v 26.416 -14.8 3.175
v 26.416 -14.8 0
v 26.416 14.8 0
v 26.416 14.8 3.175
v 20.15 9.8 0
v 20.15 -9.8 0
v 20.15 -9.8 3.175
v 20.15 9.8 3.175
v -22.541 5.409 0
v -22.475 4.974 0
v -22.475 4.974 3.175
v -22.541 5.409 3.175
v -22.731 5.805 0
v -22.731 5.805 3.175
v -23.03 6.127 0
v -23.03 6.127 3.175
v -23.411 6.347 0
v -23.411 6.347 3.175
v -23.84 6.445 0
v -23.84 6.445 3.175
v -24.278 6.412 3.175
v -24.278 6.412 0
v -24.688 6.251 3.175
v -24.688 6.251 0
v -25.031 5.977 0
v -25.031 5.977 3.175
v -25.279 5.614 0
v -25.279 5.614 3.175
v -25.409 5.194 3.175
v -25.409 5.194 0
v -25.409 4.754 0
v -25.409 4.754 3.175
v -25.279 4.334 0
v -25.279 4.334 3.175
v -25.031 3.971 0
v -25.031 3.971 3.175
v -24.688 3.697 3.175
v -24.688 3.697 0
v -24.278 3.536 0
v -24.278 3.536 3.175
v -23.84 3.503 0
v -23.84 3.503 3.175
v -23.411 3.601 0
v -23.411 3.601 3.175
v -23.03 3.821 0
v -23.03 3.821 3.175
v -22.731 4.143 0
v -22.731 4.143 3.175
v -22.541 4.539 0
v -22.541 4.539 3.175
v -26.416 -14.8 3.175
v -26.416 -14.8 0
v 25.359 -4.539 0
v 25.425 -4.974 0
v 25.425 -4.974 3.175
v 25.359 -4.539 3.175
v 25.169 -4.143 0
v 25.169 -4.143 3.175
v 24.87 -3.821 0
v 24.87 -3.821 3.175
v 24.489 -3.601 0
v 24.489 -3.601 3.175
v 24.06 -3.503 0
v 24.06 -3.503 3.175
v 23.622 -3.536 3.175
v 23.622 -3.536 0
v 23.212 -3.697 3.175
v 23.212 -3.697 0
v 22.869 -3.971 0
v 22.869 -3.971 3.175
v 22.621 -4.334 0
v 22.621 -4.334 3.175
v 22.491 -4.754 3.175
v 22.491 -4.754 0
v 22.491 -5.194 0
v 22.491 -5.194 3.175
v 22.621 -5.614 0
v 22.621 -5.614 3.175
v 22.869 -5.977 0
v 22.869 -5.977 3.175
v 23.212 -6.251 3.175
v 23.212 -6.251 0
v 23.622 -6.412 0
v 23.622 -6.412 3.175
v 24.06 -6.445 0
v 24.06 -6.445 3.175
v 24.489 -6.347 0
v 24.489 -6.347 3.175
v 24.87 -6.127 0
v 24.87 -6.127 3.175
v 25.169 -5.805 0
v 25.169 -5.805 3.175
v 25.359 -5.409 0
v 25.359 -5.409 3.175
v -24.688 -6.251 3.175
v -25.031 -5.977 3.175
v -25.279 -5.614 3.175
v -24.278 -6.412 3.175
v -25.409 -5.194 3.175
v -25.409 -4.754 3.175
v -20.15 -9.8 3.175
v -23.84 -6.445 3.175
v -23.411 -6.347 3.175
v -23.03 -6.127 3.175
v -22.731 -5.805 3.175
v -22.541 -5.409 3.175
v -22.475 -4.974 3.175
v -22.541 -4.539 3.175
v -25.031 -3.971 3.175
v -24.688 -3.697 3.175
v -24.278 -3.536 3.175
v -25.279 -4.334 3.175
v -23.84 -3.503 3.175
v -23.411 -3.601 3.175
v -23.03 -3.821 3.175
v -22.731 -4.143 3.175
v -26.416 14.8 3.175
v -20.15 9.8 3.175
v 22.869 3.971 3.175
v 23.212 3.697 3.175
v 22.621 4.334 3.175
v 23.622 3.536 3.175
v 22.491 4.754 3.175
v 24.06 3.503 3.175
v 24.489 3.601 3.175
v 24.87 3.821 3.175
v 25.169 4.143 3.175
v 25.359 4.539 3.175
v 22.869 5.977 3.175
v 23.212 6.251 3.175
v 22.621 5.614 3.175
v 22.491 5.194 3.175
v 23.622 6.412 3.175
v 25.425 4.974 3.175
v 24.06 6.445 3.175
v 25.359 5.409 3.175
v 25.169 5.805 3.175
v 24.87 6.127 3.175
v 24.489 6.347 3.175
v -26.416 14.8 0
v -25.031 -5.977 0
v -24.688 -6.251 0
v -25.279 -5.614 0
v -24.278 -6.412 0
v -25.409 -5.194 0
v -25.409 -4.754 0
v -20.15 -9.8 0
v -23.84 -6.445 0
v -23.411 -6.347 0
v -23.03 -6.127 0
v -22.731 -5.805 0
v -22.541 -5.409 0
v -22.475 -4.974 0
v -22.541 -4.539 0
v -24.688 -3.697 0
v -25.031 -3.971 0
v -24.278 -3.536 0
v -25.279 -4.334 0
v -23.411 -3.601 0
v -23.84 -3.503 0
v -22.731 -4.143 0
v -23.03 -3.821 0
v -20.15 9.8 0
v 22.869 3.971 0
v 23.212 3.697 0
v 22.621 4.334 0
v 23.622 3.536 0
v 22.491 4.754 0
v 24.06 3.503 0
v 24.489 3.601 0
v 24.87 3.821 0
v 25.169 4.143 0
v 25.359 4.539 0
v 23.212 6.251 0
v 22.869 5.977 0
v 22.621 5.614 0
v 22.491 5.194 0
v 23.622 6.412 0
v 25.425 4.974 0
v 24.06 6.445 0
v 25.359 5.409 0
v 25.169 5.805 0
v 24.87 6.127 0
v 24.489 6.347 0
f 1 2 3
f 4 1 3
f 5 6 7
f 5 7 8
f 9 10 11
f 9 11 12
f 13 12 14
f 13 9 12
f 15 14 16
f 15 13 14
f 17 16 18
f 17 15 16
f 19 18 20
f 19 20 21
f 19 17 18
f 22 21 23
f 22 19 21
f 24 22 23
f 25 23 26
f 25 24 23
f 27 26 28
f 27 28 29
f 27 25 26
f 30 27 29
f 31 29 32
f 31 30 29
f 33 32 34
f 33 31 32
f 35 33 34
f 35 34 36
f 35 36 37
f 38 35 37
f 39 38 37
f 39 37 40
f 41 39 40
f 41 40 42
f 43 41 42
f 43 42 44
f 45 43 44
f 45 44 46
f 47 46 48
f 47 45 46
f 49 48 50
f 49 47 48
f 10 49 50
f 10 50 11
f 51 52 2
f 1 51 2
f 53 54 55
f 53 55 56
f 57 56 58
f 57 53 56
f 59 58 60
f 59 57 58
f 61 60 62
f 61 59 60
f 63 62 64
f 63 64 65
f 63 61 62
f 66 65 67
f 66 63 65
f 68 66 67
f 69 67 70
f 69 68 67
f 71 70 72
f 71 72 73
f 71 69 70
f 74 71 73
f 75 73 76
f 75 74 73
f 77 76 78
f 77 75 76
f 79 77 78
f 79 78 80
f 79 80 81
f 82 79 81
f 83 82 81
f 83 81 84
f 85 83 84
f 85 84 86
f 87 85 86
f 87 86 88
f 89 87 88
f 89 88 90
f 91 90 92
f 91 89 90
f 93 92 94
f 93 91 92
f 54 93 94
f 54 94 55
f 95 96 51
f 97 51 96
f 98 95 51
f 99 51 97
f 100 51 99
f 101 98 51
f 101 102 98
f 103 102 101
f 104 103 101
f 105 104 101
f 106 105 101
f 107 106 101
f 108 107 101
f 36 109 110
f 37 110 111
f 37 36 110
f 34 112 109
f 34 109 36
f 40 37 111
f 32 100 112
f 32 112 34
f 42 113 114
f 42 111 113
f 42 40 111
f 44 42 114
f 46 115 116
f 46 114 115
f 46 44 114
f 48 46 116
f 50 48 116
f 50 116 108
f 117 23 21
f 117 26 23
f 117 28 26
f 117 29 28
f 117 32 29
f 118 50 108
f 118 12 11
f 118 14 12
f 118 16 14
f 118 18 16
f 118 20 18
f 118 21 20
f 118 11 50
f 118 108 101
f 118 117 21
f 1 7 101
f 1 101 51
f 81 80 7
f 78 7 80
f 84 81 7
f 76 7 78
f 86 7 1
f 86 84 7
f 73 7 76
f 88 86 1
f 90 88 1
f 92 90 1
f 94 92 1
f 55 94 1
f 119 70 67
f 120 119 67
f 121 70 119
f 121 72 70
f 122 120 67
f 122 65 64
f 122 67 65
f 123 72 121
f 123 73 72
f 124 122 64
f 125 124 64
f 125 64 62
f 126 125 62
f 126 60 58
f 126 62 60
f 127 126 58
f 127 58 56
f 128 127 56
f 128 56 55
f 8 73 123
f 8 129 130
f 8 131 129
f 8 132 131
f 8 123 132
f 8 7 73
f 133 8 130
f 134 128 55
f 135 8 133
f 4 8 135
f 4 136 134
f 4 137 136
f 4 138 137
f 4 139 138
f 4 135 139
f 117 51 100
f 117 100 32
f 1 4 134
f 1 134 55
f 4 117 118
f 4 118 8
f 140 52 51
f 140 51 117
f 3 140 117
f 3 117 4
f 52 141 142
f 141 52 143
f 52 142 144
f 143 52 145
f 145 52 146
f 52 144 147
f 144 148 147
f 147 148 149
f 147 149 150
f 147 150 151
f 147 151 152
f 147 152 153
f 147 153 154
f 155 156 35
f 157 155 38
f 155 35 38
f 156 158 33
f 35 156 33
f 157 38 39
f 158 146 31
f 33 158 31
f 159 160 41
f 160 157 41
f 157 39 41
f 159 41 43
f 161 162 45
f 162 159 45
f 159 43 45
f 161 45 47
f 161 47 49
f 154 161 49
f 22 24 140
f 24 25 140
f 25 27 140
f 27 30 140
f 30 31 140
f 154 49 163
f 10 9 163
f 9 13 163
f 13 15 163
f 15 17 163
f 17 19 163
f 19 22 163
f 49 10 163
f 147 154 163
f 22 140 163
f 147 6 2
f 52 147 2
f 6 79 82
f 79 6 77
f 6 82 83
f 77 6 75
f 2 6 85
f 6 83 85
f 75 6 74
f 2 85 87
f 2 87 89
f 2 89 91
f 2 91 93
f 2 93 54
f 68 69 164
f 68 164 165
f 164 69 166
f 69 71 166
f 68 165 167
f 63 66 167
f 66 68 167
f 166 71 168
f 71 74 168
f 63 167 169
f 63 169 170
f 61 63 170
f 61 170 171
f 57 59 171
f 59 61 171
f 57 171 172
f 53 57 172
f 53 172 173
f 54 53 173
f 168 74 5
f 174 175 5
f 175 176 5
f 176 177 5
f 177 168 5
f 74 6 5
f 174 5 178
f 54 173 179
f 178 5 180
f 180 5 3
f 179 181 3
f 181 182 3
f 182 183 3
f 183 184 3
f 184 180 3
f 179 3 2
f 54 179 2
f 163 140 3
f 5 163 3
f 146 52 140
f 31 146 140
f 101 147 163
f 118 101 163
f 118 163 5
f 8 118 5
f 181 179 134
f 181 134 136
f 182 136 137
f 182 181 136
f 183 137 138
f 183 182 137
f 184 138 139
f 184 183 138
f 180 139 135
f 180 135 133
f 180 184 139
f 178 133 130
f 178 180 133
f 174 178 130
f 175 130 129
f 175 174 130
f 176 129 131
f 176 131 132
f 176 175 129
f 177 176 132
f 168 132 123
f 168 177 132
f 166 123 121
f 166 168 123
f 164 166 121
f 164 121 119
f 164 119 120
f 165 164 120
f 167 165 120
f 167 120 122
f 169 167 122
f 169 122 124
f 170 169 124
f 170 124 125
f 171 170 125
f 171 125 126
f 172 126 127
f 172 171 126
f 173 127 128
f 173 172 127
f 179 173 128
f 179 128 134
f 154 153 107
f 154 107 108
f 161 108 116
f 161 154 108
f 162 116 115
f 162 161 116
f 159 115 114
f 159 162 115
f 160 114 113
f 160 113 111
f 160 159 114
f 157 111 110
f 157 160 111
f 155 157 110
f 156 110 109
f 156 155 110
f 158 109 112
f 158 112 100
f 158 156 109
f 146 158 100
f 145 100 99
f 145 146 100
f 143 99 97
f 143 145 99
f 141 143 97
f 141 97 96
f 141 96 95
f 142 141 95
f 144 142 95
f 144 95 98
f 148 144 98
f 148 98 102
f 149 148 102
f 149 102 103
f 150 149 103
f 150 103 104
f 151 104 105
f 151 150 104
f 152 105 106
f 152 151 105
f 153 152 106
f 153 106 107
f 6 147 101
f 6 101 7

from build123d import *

# Parameters (mm, degrees)
SKETCH1_W           = 6.266
SKETCH1_H           = 19.6
SKETCH1_R           = 1.475
SKETCH1_W_2         = 52.832
SKETCH1_H_2         = 5
BOSS_EXTRUDE2_DEPTH = 3.175


with BuildPart() as part:
    # Sketch1 → Boss-Extrude2 (new body)
    # profile 1 of 4: a face of its own
    with BuildSketch(Plane.XY):
        with Locations((-23.283, 0)):
            Rectangle(SKETCH1_W, SKETCH1_H)
        with Locations((-23.95, -4.974)):
            Circle(SKETCH1_R, mode=Mode.SUBTRACT)
        with Locations((-23.95, 4.974)):
            Circle(SKETCH1_R, mode=Mode.SUBTRACT)
    # profile 2 of 4: a face of its own
    with BuildSketch(Plane.XY):
        with Locations((23.283, 0)):
            Rectangle(SKETCH1_W, SKETCH1_H)
        with Locations((23.95, -4.974)):
            Circle(SKETCH1_R, mode=Mode.SUBTRACT)
        with Locations((23.95, 4.974)):
            Circle(SKETCH1_R, mode=Mode.SUBTRACT)
    # profile 3 of 4: a face of its own
    with BuildSketch(Plane.XY):
        with Locations((0, 12.3)):
            Rectangle(SKETCH1_W_2, SKETCH1_H_2)
    # profile 4 of 4: a face of its own
    with BuildSketch(Plane.XY):
        with Locations((0, -12.3)):
            Rectangle(SKETCH1_W_2, SKETCH1_H_2)
    extrude(amount=BOSS_EXTRUDE2_DEPTH)


solid = part.part
